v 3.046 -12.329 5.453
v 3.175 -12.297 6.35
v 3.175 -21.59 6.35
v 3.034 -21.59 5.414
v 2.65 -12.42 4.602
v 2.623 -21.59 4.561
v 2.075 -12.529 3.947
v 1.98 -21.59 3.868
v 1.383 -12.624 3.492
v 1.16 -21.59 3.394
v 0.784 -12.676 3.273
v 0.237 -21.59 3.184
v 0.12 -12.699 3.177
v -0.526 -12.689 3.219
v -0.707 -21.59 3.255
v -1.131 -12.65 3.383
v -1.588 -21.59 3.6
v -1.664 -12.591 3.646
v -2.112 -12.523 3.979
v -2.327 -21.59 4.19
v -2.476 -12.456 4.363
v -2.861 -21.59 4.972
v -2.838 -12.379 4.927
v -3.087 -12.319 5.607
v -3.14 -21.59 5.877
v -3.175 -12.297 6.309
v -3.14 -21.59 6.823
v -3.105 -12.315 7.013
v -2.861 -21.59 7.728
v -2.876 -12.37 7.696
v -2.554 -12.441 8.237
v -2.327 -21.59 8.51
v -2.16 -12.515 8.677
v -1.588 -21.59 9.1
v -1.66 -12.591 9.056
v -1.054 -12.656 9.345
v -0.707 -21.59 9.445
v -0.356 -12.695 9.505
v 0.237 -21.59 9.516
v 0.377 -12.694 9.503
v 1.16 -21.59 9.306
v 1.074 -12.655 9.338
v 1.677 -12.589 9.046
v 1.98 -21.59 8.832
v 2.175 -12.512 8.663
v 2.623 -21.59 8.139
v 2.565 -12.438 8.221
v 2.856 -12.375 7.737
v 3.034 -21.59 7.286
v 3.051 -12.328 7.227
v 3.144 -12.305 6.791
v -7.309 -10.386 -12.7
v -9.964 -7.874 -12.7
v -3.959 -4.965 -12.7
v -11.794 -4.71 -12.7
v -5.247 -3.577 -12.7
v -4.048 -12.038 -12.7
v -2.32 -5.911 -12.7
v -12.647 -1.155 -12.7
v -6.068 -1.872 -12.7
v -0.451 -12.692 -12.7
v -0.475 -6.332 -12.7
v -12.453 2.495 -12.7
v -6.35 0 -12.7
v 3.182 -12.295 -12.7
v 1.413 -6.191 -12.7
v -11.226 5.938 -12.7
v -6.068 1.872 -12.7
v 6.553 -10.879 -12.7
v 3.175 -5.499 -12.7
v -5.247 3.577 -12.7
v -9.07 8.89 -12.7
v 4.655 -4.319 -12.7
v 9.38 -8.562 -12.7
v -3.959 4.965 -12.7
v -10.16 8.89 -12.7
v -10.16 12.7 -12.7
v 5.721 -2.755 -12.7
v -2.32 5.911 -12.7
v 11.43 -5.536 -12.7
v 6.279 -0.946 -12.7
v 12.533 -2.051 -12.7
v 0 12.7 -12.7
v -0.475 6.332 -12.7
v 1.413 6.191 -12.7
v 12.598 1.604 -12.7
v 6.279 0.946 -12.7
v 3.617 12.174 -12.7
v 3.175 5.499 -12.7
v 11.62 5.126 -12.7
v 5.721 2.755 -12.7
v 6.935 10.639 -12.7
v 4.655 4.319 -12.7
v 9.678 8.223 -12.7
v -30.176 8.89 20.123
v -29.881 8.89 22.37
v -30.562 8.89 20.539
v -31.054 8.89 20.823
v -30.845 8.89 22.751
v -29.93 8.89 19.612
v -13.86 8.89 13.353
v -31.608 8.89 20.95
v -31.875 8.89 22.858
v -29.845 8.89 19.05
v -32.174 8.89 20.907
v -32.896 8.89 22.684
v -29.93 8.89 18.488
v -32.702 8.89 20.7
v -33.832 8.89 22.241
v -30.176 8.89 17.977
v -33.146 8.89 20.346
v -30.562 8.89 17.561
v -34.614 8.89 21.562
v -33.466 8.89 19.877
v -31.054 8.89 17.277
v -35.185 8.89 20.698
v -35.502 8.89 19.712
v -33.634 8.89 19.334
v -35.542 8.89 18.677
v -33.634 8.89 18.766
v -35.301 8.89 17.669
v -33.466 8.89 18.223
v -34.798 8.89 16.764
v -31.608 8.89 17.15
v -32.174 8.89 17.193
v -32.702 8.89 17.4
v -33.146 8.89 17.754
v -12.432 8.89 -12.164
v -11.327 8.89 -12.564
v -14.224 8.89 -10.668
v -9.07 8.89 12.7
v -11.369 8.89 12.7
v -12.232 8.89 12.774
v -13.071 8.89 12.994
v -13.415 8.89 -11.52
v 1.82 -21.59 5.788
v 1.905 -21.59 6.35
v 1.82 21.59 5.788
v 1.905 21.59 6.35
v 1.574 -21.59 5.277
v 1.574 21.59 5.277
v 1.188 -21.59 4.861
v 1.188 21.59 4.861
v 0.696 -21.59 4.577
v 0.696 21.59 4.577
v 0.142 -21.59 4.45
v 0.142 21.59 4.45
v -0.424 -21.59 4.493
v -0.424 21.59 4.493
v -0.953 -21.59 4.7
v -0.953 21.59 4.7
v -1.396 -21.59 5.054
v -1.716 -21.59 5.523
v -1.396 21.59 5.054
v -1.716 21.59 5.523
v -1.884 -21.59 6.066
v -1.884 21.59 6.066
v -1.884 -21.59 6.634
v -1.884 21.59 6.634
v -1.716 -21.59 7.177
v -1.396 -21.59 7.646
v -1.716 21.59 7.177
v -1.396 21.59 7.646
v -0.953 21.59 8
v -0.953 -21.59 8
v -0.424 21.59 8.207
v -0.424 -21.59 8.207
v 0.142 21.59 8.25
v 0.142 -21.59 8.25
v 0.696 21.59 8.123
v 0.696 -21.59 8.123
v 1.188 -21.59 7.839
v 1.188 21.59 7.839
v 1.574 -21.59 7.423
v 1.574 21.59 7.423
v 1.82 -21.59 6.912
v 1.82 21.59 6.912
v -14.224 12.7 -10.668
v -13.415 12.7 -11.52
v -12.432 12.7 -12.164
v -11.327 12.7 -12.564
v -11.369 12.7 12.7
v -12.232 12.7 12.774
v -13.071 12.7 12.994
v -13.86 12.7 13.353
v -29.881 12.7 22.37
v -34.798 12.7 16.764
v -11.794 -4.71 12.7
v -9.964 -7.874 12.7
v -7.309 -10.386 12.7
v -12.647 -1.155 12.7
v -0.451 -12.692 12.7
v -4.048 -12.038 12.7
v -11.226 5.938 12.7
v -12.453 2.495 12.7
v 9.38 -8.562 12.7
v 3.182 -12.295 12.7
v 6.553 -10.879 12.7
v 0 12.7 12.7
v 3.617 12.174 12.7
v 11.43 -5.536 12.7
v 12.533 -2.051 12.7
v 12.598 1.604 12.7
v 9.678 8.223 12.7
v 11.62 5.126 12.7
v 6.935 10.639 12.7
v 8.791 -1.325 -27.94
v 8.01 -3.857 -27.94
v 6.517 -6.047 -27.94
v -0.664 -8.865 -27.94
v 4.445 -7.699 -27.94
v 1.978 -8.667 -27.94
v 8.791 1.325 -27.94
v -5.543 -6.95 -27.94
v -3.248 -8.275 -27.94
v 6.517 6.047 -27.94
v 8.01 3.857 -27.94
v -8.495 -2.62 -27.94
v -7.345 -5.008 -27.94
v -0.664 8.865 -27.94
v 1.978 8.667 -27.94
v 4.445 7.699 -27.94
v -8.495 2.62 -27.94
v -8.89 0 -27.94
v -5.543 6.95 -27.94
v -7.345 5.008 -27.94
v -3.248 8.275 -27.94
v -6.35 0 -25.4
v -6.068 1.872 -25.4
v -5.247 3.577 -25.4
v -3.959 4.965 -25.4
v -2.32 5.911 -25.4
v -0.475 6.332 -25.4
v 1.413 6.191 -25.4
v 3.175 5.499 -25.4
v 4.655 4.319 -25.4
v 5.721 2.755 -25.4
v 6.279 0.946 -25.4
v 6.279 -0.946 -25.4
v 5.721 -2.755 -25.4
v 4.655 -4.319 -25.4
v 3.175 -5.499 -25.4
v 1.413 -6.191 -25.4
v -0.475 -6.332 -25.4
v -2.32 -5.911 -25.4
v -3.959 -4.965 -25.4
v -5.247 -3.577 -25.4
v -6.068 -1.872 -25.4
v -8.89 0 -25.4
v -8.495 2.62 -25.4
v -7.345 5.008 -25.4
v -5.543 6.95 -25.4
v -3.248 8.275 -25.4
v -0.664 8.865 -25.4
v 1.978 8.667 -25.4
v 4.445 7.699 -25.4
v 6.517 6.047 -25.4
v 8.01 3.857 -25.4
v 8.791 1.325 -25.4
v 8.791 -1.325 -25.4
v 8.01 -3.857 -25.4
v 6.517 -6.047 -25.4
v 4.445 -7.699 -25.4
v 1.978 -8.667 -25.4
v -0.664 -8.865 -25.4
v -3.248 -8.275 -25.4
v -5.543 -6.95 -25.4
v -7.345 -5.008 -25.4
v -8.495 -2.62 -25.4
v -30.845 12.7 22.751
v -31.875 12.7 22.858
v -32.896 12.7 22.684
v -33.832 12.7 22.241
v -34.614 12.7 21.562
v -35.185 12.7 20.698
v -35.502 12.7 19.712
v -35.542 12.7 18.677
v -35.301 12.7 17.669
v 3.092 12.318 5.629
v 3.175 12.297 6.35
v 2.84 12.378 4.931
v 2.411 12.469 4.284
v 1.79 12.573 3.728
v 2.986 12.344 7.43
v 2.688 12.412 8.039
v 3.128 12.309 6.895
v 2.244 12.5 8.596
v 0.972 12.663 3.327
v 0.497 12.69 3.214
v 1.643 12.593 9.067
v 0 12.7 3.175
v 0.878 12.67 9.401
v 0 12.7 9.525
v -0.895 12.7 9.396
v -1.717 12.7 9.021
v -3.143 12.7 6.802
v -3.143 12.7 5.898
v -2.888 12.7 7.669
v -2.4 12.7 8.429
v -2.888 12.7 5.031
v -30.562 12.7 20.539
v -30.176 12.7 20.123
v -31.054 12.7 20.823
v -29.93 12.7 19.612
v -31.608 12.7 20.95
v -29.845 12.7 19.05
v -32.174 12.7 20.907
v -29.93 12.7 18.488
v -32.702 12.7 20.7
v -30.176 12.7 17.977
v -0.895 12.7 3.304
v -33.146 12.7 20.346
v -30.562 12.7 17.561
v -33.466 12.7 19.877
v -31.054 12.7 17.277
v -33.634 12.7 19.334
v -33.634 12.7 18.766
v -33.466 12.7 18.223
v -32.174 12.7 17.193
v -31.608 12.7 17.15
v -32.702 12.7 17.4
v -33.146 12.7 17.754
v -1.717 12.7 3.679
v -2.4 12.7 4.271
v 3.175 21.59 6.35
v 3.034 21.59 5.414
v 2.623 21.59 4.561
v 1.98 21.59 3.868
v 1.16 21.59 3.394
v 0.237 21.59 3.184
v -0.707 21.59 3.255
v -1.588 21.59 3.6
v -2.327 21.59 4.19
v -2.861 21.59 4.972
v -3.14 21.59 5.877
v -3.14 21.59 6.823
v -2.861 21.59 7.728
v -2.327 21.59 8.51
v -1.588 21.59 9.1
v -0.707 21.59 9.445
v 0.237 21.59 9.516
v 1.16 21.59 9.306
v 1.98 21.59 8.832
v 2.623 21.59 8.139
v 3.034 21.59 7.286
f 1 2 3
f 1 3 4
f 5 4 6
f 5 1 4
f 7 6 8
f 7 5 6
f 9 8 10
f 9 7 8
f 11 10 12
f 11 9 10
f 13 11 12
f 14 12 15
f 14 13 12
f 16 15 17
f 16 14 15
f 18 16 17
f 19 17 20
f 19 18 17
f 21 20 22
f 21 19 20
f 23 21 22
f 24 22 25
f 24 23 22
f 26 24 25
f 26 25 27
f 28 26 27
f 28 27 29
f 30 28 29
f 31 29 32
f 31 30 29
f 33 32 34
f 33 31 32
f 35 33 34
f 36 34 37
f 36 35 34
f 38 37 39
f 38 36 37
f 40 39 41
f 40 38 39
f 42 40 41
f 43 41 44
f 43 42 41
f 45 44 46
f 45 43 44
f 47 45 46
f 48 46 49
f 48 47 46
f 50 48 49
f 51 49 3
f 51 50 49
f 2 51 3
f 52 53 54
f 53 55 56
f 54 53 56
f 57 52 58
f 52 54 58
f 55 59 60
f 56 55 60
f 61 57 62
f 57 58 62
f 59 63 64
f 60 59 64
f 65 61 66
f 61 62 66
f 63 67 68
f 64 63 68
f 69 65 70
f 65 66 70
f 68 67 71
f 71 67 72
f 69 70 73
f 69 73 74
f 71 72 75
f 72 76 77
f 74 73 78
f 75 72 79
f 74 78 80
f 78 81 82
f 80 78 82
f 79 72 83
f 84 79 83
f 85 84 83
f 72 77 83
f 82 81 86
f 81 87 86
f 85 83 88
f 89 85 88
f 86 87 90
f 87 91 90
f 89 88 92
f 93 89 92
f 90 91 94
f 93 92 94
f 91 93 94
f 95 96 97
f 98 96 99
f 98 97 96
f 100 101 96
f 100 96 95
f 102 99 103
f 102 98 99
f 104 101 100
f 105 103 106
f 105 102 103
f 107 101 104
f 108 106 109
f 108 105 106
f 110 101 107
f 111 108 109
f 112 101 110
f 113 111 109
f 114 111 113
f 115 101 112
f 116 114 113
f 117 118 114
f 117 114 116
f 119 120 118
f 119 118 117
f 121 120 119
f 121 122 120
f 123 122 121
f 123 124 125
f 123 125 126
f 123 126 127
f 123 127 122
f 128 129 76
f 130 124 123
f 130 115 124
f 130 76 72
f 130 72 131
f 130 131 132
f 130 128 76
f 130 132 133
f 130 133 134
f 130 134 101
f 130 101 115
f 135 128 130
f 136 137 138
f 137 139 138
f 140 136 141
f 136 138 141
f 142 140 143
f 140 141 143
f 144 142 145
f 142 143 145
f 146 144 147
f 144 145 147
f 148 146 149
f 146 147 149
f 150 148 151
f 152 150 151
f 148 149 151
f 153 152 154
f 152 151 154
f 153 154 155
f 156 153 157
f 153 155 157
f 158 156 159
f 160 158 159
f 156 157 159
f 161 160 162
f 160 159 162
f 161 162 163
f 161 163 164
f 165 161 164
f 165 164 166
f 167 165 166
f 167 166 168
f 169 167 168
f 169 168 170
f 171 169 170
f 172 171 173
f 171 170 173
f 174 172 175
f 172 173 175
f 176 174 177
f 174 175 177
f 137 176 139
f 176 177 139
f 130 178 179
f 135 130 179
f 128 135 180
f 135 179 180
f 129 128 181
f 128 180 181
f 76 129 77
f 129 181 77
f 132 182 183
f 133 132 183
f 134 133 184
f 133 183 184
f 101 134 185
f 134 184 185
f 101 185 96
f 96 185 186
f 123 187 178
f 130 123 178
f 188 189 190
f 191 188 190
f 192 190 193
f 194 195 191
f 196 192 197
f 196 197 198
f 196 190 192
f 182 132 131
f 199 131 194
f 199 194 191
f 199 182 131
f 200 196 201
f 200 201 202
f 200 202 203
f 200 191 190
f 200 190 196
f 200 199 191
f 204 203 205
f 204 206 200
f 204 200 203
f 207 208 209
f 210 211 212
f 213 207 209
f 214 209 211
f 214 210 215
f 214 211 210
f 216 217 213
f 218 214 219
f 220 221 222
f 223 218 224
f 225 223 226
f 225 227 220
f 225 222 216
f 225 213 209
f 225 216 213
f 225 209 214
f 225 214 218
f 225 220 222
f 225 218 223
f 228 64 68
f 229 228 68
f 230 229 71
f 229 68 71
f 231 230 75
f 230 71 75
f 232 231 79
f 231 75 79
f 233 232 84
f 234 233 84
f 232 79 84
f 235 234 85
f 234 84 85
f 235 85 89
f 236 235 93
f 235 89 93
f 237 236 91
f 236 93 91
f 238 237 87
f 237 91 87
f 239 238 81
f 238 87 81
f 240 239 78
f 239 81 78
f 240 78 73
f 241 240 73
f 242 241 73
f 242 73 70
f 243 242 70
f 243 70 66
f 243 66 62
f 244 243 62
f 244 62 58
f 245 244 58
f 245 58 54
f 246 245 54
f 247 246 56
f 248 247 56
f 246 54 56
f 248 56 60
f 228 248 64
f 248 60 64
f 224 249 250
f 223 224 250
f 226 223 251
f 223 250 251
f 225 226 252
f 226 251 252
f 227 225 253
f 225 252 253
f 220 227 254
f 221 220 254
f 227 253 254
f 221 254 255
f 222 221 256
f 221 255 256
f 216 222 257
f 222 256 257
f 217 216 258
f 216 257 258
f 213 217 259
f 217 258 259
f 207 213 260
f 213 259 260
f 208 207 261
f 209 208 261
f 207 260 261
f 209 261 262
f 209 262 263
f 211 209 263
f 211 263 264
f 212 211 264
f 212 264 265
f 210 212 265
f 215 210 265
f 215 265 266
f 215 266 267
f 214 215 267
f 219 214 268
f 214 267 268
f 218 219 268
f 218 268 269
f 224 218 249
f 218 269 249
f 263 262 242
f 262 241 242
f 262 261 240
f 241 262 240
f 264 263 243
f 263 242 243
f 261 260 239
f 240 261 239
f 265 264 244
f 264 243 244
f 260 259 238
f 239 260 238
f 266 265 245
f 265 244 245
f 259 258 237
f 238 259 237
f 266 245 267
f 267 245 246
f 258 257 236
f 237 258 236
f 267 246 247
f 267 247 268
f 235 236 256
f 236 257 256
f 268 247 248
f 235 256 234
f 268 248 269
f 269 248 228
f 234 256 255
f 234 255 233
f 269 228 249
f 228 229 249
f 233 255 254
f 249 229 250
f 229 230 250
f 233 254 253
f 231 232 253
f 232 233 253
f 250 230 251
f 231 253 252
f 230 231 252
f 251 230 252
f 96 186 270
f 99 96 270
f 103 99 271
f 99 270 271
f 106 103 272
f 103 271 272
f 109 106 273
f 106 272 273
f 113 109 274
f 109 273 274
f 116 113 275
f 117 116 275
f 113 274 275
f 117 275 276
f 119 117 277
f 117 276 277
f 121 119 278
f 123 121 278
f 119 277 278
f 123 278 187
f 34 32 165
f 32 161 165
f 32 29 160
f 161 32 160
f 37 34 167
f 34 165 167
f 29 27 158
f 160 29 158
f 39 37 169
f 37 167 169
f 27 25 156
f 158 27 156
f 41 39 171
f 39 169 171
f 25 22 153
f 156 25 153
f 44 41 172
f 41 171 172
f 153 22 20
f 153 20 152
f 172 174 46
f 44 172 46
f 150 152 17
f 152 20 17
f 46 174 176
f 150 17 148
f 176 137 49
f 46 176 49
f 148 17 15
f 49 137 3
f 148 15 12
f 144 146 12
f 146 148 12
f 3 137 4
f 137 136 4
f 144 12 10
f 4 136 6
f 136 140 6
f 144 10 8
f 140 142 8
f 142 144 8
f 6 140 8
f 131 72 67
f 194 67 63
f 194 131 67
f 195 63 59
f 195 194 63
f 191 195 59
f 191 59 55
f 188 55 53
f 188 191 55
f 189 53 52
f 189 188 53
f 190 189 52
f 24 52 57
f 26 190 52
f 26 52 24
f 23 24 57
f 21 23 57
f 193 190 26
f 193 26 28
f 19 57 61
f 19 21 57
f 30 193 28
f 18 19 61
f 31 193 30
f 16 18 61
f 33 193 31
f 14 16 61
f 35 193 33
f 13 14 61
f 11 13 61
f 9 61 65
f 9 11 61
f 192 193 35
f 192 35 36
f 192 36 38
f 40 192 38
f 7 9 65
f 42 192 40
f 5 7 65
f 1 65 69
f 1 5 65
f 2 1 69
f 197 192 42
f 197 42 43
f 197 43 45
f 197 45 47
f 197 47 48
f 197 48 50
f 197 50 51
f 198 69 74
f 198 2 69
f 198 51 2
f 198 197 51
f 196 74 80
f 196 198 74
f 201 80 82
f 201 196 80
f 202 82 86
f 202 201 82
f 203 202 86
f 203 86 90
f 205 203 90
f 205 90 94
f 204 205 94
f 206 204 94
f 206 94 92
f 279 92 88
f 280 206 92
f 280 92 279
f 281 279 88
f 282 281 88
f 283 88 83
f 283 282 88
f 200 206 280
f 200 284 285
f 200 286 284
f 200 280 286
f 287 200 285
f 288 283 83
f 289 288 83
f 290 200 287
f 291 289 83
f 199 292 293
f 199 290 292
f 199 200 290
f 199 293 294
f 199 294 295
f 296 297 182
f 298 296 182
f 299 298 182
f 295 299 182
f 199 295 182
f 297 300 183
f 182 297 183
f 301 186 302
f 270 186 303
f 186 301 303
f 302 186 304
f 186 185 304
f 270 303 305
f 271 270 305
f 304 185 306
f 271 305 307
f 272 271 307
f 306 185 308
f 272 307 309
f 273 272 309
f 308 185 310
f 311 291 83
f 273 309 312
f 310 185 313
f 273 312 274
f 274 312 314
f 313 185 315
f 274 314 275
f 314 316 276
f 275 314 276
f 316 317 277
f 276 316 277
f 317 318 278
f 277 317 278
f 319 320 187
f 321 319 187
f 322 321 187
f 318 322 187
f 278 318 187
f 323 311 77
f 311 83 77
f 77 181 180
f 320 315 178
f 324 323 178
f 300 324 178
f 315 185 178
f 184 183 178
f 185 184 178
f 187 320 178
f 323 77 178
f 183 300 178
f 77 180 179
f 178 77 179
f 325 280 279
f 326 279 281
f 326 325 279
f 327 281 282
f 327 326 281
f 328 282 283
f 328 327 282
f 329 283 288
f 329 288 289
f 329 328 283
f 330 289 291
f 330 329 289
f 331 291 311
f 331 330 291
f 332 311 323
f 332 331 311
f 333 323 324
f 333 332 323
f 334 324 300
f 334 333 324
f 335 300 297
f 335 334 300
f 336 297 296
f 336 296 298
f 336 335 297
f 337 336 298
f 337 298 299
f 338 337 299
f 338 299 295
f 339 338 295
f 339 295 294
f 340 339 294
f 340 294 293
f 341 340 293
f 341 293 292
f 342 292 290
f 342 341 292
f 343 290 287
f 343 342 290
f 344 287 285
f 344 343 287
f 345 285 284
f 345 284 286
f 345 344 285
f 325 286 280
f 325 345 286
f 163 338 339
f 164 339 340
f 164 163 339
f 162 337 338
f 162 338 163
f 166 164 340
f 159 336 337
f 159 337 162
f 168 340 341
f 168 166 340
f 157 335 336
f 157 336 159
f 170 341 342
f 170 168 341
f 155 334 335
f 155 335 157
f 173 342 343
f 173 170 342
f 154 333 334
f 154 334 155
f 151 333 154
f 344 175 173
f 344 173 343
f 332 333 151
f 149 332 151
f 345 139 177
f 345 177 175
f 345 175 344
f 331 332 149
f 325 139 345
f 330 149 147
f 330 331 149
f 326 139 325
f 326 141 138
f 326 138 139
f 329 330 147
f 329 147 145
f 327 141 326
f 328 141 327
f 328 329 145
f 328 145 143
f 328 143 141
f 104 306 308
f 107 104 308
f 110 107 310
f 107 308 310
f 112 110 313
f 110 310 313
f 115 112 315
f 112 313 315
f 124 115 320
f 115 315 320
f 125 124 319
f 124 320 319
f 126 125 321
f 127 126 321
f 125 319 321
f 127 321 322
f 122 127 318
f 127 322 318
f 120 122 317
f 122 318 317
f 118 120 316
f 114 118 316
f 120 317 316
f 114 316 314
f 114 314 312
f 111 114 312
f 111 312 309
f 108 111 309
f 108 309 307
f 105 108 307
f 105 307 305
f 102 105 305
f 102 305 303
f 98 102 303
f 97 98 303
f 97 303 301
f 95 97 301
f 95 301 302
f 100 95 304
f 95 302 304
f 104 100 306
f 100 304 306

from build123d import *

# Parameters (mm, degrees)
SKETCH1_R               = 12.7
BOSS_EXTRUDE1_DEPTH     = 12.7
SKETCH2_R               = 1.905
BOSS_EXTRUDE2_DEPTH     = 3.81
SKETCH3_R               = 6.35
BOSS_EXTRUDE3_DEPTH     = 12.7
SKETCH4_R               = 8.89
BOSS_EXTRUDE4_DEPTH     = 2.54
SKETCH5_R               = 3.175
BOSS_EXTRUDE5_DEPTH     = 21.59
SKETCH6_R               = 1.905
CUT_EXTRUDE1_DEPTH      = 22.5900001
CUT_EXTRUDE1_DEPTH_BACK = 22.5900001


with BuildPart() as part:
    # Sketch1 → Boss-Extrude1 (new body, symmetric)
    with BuildSketch(Plane.XY):
        Circle(SKETCH1_R)
    extrude(amount=BOSS_EXTRUDE1_DEPTH, both=True)

    # Sketch2 → Boss-Extrude2 (add)
    with BuildSketch(Plane(origin=(0, 12.7, 0), x_dir=(1, 0, 0), z_dir=(0, 1, 0))):
        with BuildLine():
            Line((0, 12.7), (0, -12.7))
            Line((0, -12.7), (-11.368596271, -12.7))
            ThreePointArc((-11.368596271, -12.7), (-12.656501603, -12.865969083), (-13.860252421, -13.353031553))
            Line((-13.860252421, -13.353031553), (-29.881257888, -22.370226336))
            ThreePointArc((-29.881257888, -22.370226336), (-34.614455572, -21.562169237), (-34.798, -16.764))
            Line((-34.798, -16.764), (-14.224, 10.668))
            ThreePointArc((-14.224, 10.668), (-12.431845065, 12.16369013), (-10.16, 12.7))
            Line((-10.16, 12.7), (0, 12.7))
        make_face()
        with Locations((-31.75, -19.05)):
            Circle(SKETCH2_R, mode=Mode.SUBTRACT)
    extrude(amount=-BOSS_EXTRUDE2_DEPTH)

    # Sketch3 → Boss-Extrude3 (add)
    with BuildSketch(Plane(origin=(0, 0, -12.7), x_dir=(-1, 0, 0), z_dir=(0, 0, -1))):
        Circle(SKETCH3_R)
    extrude(amount=BOSS_EXTRUDE3_DEPTH)

    # Sketch4 → Boss-Extrude4 (add)
    with BuildSketch(Plane(origin=(0, 0, -25.4), x_dir=(-1, 0, 0), z_dir=(0, 0, -1))):
        Circle(SKETCH4_R)
    extrude(amount=BOSS_EXTRUDE4_DEPTH)

    # Sketch5 → Boss-Extrude5 (add, symmetric)
    with BuildSketch(Plane(origin=(0, 0, 0), x_dir=(1, 0, 0), z_dir=(0, 1, 0))):
        with Locations((0, -6.35)):
            Circle(SKETCH5_R)
    extrude(amount=BOSS_EXTRUDE5_DEPTH, both=True)

    # Sketch6 → Cut-Extrude1 (cut, two sides)
    with BuildSketch(Plane(origin=(0, 0, 0), x_dir=(1, 0, 0), z_dir=(0, 1, 0))) as cut_extrude1_sk:
        with Locations((0, -6.35)):
            Circle(SKETCH6_R)
    extrude(amount=CUT_EXTRUDE1_DEPTH, mode=Mode.SUBTRACT)
    extrude(cut_extrude1_sk.sketch, amount=-CUT_EXTRUDE1_DEPTH_BACK, mode=Mode.SUBTRACT)


solid = part.part
